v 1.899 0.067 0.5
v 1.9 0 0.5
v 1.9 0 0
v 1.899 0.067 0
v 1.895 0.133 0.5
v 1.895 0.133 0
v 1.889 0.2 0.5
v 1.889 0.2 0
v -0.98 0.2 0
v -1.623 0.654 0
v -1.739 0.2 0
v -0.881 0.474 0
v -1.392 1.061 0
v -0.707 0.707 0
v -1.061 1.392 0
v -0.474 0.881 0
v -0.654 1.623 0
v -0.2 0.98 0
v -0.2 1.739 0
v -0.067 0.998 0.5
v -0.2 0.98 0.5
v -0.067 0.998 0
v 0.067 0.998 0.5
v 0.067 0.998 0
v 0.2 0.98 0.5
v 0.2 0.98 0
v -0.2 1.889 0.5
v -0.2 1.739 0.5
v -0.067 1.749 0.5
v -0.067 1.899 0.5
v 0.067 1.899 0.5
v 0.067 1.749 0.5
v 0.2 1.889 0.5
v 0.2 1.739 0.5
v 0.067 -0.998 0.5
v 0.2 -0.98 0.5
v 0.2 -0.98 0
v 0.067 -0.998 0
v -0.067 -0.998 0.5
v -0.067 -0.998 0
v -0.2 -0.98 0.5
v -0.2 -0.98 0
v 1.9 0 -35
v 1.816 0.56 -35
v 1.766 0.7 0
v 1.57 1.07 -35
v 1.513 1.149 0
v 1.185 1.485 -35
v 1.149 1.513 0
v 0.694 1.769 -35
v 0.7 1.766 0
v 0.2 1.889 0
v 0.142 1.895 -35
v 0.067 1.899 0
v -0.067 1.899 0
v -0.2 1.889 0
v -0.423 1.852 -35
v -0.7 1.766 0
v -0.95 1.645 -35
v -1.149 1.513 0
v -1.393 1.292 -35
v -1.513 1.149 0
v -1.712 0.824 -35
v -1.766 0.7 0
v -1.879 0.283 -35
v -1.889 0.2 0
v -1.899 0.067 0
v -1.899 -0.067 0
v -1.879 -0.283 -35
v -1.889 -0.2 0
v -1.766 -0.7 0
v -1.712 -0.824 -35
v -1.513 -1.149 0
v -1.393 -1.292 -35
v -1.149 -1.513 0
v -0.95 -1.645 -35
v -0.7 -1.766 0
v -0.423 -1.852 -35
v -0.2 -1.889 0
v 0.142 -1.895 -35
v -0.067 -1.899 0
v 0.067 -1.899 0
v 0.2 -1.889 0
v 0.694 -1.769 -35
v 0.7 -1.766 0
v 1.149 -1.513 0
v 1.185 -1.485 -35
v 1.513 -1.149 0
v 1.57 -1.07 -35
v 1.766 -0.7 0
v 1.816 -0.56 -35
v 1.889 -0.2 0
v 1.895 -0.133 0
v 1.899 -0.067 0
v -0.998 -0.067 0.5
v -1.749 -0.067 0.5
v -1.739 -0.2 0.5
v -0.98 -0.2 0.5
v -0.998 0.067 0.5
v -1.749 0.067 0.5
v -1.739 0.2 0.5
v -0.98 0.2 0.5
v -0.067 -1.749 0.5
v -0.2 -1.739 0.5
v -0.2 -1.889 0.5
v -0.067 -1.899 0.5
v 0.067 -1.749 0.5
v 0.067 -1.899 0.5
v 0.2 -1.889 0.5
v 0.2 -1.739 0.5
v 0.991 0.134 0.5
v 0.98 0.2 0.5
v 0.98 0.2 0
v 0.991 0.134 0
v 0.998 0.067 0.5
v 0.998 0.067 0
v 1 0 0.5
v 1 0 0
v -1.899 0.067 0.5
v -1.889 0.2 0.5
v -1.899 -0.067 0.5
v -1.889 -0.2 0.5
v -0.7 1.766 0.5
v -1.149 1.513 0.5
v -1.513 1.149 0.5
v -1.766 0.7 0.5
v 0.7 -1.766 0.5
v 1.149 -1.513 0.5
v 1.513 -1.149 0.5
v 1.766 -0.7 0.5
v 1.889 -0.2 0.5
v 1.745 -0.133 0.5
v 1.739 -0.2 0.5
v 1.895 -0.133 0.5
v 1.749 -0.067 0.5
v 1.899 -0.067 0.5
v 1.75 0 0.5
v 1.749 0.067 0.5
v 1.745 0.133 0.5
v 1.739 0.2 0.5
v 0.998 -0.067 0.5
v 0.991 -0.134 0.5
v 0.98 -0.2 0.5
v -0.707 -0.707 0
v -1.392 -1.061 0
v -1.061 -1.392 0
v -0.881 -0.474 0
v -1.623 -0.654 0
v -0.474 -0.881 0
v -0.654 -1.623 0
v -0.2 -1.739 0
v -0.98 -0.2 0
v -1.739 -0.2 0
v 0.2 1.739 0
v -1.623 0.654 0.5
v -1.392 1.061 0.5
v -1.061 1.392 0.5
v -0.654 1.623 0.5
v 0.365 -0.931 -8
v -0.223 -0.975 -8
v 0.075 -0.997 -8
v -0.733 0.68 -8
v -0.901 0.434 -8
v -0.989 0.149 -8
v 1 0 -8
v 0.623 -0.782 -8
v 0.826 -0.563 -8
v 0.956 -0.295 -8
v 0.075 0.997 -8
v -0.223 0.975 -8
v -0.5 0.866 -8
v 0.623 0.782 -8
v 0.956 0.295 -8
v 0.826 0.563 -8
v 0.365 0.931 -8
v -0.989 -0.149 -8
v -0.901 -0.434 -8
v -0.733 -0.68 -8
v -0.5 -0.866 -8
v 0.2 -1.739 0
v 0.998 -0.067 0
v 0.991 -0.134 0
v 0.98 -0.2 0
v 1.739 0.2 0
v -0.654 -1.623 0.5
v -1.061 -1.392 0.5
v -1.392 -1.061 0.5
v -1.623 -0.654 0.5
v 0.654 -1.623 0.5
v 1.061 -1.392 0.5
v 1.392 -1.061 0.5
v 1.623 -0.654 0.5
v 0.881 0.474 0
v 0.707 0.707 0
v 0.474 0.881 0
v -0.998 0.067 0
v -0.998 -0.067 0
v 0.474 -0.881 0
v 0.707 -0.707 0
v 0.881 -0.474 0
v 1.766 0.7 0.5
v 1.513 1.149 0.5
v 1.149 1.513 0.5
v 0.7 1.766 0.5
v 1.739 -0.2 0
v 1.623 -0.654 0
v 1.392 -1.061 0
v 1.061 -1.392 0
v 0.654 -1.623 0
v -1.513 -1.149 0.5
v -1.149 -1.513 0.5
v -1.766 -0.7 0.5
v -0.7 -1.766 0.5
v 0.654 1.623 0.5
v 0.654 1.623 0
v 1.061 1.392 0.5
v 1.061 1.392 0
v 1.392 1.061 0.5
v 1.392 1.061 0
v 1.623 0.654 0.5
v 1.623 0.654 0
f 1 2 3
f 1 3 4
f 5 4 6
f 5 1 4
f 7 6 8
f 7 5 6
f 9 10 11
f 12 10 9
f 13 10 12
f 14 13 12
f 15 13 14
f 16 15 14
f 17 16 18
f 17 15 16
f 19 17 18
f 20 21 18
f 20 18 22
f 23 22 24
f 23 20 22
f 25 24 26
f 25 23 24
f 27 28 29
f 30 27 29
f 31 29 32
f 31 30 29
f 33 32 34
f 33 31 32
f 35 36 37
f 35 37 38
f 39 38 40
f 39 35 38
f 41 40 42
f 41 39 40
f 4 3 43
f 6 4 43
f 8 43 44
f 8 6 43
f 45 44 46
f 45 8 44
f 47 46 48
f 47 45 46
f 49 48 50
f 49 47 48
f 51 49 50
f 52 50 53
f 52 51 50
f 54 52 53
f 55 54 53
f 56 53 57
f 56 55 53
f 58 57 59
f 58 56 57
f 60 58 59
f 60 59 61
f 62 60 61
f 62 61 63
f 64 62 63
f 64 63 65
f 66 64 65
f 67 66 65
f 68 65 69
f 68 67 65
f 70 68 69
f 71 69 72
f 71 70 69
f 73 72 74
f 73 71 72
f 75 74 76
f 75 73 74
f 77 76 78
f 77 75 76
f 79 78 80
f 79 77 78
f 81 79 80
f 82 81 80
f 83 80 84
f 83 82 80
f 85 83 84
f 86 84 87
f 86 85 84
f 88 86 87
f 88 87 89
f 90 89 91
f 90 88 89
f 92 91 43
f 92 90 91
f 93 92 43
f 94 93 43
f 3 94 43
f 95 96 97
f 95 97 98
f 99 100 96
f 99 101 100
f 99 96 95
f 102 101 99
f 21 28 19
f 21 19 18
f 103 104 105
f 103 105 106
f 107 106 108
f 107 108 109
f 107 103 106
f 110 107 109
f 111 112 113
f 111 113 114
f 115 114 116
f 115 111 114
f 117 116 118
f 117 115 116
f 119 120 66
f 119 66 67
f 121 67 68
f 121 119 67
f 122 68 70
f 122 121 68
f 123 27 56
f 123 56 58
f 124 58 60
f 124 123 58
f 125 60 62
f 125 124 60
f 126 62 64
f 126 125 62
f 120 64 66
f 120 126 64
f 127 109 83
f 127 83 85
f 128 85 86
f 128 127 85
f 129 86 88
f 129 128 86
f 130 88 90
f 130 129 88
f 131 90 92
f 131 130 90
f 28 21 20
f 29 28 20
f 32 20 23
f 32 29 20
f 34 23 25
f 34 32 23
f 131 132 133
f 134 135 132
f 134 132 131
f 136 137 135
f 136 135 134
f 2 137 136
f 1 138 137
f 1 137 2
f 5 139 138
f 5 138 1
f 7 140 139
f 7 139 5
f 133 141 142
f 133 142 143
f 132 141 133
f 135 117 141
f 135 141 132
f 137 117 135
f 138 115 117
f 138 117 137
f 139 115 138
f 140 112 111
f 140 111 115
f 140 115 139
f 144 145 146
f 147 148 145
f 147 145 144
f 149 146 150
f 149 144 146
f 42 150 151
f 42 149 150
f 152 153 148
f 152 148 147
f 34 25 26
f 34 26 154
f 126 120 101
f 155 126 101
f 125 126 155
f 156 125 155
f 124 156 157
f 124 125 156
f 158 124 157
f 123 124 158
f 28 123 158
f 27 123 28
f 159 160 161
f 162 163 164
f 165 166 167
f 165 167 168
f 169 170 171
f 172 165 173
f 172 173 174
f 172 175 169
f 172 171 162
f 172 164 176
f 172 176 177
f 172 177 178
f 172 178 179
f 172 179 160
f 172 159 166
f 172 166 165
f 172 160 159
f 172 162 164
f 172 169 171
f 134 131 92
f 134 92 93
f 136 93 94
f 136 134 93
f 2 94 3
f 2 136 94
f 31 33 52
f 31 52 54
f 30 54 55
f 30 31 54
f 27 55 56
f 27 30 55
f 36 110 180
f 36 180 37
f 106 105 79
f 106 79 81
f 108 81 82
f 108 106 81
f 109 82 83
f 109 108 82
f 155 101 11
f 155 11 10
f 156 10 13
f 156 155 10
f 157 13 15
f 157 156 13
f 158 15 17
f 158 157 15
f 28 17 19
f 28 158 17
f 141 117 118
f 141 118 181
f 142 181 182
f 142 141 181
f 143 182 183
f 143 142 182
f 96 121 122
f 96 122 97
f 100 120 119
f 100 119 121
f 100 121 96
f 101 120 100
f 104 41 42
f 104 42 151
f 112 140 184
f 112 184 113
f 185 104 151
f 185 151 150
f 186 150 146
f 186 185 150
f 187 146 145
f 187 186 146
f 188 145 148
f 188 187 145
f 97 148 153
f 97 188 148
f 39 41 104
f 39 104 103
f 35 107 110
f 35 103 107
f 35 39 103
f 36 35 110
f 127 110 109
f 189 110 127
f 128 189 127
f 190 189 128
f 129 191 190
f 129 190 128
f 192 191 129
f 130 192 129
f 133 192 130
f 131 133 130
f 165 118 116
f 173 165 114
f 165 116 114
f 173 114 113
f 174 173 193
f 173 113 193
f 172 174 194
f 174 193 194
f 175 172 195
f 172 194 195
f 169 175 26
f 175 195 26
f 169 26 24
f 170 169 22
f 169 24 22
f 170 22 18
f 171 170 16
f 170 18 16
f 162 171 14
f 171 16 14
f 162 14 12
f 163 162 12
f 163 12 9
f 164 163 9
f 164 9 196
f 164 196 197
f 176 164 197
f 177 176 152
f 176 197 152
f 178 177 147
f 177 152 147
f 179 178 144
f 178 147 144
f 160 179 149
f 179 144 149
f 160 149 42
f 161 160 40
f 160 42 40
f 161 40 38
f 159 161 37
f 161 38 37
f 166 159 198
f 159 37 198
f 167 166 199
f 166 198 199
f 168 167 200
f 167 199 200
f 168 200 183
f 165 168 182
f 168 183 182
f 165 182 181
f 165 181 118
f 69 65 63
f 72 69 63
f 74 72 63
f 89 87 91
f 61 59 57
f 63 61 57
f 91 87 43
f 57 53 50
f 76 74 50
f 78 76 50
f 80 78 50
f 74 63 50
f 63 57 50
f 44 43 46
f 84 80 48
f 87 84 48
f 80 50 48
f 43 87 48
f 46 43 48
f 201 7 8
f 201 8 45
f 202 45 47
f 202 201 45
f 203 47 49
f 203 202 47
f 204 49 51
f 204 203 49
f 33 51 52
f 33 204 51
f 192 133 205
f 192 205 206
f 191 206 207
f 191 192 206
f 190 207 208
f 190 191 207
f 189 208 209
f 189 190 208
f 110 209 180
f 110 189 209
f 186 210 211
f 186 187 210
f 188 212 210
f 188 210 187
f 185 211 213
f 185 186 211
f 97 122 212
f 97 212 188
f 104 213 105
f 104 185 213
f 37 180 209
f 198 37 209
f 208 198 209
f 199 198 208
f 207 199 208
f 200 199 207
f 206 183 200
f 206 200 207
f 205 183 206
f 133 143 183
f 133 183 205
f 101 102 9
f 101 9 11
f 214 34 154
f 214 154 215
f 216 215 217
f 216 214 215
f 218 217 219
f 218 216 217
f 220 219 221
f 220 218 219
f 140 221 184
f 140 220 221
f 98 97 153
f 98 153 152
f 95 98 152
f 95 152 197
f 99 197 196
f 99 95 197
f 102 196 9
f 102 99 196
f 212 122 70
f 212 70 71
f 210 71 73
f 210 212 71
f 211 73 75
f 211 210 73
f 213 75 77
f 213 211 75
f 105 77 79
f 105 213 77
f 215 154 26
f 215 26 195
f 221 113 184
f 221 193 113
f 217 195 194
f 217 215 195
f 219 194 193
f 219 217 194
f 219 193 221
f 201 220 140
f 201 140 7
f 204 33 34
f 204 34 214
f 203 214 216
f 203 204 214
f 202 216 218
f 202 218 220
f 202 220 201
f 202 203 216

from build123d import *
from build123d.topology import SkipClean

# Parameters (mm, degrees)
SKETCH_1_R          = 1.9
EXTRUDE_1_DEPTH     = 35
SKETCH_3_R          = 1
CUT_EXTRUDE_1_DEPTH = 8
EXTRUDE_START       = 0.5
EXTRUDE_3_DEPTH     = 0.5


with BuildPart() as part:
    # 草图1 → 凸台-拉伸1 (new body)
    with BuildSketch(Plane.XY):
        Circle(SKETCH_1_R)
    extrude(amount=-EXTRUDE_1_DEPTH)

    # 草图3 → 切除-拉伸1 (cut)
    with BuildSketch(Plane.XY):
        Circle(SKETCH_3_R)
    extrude(amount=-CUT_EXTRUDE_1_DEPTH, mode=Mode.SUBTRACT)

    # 草图4 → 凸台-拉伸3 (add)
    with SkipClean():  # the faces are left unmerged after this step: merging them gives an invalid solid
        with BuildSketch(Plane.XY.offset(EXTRUDE_START)):
            with BuildLine():
                Line((-1.738533865, 0.2), (-1.889444363, 0.2))
                ThreePointArc((-1.889444363, 0.2), (-1.9, 0), (-1.889444363, -0.2))
                Line((-1.889444363, -0.2), (-1.738533865, -0.2))
                ThreePointArc((-1.738533865, -0.2), (-1.75, 0), (-1.738533865, 0.2))
            make_face()
            with BuildLine():
                ThreePointArc((1.9, 0), (1.897359256, 0.10013918), (1.889444363, 0.2))
                Line((1.889444363, 0.2), (1.738533865, 0.2))
                ThreePointArc((1.738533865, 0.2), (1.747131115, 0.100164205), (1.75, 0))
                ThreePointArc((1.75, 0), (1.747131115, -0.100164205), (1.738533865, -0.2))
                Line((1.738533865, -0.2), (1.889444363, -0.2))
                ThreePointArc((1.889444363, -0.2), (1.897359256, -0.10013918), (1.9, 0))
            make_face()
            with BuildLine():
                Line((0.2, -1.738533865), (0.2, -1.889444363))
                ThreePointArc((0.2, -1.889444363), (1.343502884, -1.343502884), (1.889444363, -0.2))
                Line((1.889444363, -0.2), (1.738533865, -0.2))
                ThreePointArc((1.738533865, -0.2), (1.237436867, -1.237436867), (0.2, -1.738533865))
            make_face()
            with BuildLine():
                Line((-0.2, -1.738533865), (-0.2, -1.889444363))
                ThreePointArc((-0.2, -1.889444363), (0, -1.9), (0.2, -1.889444363))
                Line((0.2, -1.889444363), (0.2, -1.738533865))
                ThreePointArc((0.2, -1.738533865), (0, -1.75), (-0.2, -1.738533865))
            make_face()
            with BuildLine():
                Line((-1.738533865, -0.2), (-1.889444363, -0.2))
                ThreePointArc((-1.889444363, -0.2), (-1.343502884, -1.343502884), (-0.2, -1.889444363))
                Line((-0.2, -1.889444363), (-0.2, -1.738533865))
                ThreePointArc((-0.2, -1.738533865), (-1.237436867, -1.237436867), (-1.738533865, -0.2))
            make_face()
            with BuildLine():
                ThreePointArc((-0.2, 1.889444363), (-1.343502884, 1.343502884), (-1.889444363, 0.2))
                Line((-1.889444363, 0.2), (-1.738533865, 0.2))
                ThreePointArc((-1.738533865, 0.2), (-1.237436867, 1.237436867), (-0.2, 1.738533865))
                Line((-0.2, 1.738533865), (-0.2, 1.889444363))
            make_face()
            with BuildLine():
                ThreePointArc((1.889444363, 0.2), (1.343502884, 1.343502884), (0.2, 1.889444363))
                Line((0.2, 1.889444363), (0.2, 1.738533865))
                ThreePointArc((0.2, 1.738533865), (1.237436867, 1.237436867), (1.738533865, 0.2))
                Line((1.738533865, 0.2), (1.889444363, 0.2))
            make_face()
            with BuildLine():
                ThreePointArc((0.2, 1.889444363), (0, 1.9), (-0.2, 1.889444363))
                Line((-0.2, 1.889444363), (-0.2, 1.738533865))
                ThreePointArc((-0.2, 1.738533865), (0, 1.75), (0.2, 1.738533865))
                Line((0.2, 1.738533865), (0.2, 1.889444363))
            make_face()
            with BuildLine():
                Line((-0.979795897, 0.2), (-1.738533865, 0.2))
                ThreePointArc((-1.738533865, 0.2), (-1.75, 0), (-1.738533865, -0.2))
                Line((-1.738533865, -0.2), (-0.979795897, -0.2))
                ThreePointArc((-0.979795897, -0.2), (-1, 0), (-0.979795897, 0.2))
            make_face()
            with BuildLine():
                ThreePointArc((1.75, 0), (1.747131115, 0.100164205), (1.738533865, 0.2))
                Line((1.738533865, 0.2), (0.979795897, 0.2))
                ThreePointArc((0.979795897, 0.2), (0.994936153, 0.100508962), (1, 0))
                ThreePointArc((1, 0), (0.994936153, -0.100508962), (0.979795897, -0.2))
                Line((0.979795897, -0.2), (1.738533865, -0.2))
                ThreePointArc((1.738533865, -0.2), (1.747131115, -0.100164205), (1.75, 0))
            make_face()
            with BuildLine():
                ThreePointArc((0.2, 1.738533865), (0, 1.75), (-0.2, 1.738533865))
                Line((-0.2, 1.738533865), (-0.2, 0.979795897))
                ThreePointArc((-0.2, 0.979795897), (0, 1), (0.2, 0.979795897))
                Line((0.2, 0.979795897), (0.2, 1.738533865))
            make_face()
            with BuildLine():
                Line((-0.2, -0.979795897), (-0.2, -1.738533865))
                ThreePointArc((-0.2, -1.738533865), (0, -1.75), (0.2, -1.738533865))
                Line((0.2, -1.738533865), (0.2, -0.979795897))
                ThreePointArc((0.2, -0.979795897), (0, -1), (-0.2, -0.979795897))
            make_face()
        extrude(amount=-EXTRUDE_3_DEPTH)


solid = part.part
